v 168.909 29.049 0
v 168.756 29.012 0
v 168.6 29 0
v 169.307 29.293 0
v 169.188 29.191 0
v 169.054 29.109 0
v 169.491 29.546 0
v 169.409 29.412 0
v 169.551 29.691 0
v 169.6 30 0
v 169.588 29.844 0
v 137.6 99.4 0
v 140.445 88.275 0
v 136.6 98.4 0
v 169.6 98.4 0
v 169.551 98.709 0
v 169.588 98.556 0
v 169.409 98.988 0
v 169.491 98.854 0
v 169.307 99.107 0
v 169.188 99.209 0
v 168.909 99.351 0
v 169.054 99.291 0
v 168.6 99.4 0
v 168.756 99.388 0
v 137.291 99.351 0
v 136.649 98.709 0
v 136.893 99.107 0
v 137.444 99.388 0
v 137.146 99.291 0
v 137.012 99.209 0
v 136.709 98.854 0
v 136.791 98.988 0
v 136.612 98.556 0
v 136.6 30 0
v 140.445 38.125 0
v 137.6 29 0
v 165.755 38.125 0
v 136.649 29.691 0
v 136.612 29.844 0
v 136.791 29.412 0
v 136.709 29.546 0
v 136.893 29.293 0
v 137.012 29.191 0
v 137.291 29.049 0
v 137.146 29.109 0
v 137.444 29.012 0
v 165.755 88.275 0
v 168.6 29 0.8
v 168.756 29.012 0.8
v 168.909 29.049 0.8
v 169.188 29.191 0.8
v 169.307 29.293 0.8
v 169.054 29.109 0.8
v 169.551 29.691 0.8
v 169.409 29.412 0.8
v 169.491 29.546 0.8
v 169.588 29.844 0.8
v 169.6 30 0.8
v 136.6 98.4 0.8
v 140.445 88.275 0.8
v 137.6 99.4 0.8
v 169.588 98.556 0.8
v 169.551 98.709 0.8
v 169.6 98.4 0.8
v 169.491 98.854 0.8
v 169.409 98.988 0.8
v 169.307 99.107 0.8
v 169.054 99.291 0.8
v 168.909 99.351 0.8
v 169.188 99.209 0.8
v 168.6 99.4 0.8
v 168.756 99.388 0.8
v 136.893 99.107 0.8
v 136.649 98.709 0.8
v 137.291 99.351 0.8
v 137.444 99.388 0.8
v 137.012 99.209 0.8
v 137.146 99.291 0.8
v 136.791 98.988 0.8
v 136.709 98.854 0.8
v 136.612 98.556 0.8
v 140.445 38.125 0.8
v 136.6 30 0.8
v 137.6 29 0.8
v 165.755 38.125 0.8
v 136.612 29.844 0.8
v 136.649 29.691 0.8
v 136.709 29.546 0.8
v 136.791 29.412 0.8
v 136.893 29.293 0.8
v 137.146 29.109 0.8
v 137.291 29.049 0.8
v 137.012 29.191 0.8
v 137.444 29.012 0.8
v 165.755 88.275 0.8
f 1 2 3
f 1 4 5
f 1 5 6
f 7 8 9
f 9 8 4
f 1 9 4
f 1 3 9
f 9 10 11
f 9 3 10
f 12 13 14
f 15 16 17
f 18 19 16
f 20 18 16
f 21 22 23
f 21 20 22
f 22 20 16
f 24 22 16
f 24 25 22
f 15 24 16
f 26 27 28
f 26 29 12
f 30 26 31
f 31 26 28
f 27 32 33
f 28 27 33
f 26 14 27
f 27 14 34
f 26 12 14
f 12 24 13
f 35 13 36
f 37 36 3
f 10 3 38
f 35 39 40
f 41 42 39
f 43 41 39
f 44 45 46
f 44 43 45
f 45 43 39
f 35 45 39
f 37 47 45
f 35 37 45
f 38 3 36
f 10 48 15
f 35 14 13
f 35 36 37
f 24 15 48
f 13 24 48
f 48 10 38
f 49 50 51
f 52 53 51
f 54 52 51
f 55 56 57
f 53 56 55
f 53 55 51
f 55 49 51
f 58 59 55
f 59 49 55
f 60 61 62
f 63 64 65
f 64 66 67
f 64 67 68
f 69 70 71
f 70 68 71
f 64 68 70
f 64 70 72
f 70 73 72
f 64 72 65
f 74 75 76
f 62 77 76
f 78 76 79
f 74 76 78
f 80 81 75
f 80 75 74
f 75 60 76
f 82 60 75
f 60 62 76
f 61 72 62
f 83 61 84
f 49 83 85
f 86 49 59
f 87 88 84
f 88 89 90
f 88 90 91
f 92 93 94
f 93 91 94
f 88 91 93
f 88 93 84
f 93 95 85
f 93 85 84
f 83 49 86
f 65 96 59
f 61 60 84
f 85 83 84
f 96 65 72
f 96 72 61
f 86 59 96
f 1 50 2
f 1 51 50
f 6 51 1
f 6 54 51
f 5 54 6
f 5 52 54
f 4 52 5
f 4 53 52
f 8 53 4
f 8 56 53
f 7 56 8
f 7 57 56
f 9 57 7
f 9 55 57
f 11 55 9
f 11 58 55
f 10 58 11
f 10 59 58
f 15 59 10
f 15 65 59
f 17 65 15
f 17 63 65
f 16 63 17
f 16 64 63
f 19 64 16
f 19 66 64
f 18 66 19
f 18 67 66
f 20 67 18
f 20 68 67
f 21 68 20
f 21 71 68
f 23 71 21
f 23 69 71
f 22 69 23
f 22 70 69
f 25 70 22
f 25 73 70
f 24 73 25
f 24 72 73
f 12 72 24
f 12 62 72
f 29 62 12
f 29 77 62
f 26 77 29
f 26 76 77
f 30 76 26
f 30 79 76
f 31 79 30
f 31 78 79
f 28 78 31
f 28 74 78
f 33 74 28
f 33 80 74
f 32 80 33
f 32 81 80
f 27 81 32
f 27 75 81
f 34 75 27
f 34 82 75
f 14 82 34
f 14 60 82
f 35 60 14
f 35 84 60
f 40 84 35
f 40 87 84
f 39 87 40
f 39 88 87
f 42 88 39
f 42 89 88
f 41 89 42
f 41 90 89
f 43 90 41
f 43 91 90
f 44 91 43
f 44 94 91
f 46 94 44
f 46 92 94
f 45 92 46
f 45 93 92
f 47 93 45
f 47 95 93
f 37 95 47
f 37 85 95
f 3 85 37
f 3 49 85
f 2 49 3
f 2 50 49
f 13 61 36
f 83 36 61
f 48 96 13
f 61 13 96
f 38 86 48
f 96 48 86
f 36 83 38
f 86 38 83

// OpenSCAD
include <../lib/kobo-meshcore-case-lib.scad>;
$fn = 40;
bezel_gasket();
